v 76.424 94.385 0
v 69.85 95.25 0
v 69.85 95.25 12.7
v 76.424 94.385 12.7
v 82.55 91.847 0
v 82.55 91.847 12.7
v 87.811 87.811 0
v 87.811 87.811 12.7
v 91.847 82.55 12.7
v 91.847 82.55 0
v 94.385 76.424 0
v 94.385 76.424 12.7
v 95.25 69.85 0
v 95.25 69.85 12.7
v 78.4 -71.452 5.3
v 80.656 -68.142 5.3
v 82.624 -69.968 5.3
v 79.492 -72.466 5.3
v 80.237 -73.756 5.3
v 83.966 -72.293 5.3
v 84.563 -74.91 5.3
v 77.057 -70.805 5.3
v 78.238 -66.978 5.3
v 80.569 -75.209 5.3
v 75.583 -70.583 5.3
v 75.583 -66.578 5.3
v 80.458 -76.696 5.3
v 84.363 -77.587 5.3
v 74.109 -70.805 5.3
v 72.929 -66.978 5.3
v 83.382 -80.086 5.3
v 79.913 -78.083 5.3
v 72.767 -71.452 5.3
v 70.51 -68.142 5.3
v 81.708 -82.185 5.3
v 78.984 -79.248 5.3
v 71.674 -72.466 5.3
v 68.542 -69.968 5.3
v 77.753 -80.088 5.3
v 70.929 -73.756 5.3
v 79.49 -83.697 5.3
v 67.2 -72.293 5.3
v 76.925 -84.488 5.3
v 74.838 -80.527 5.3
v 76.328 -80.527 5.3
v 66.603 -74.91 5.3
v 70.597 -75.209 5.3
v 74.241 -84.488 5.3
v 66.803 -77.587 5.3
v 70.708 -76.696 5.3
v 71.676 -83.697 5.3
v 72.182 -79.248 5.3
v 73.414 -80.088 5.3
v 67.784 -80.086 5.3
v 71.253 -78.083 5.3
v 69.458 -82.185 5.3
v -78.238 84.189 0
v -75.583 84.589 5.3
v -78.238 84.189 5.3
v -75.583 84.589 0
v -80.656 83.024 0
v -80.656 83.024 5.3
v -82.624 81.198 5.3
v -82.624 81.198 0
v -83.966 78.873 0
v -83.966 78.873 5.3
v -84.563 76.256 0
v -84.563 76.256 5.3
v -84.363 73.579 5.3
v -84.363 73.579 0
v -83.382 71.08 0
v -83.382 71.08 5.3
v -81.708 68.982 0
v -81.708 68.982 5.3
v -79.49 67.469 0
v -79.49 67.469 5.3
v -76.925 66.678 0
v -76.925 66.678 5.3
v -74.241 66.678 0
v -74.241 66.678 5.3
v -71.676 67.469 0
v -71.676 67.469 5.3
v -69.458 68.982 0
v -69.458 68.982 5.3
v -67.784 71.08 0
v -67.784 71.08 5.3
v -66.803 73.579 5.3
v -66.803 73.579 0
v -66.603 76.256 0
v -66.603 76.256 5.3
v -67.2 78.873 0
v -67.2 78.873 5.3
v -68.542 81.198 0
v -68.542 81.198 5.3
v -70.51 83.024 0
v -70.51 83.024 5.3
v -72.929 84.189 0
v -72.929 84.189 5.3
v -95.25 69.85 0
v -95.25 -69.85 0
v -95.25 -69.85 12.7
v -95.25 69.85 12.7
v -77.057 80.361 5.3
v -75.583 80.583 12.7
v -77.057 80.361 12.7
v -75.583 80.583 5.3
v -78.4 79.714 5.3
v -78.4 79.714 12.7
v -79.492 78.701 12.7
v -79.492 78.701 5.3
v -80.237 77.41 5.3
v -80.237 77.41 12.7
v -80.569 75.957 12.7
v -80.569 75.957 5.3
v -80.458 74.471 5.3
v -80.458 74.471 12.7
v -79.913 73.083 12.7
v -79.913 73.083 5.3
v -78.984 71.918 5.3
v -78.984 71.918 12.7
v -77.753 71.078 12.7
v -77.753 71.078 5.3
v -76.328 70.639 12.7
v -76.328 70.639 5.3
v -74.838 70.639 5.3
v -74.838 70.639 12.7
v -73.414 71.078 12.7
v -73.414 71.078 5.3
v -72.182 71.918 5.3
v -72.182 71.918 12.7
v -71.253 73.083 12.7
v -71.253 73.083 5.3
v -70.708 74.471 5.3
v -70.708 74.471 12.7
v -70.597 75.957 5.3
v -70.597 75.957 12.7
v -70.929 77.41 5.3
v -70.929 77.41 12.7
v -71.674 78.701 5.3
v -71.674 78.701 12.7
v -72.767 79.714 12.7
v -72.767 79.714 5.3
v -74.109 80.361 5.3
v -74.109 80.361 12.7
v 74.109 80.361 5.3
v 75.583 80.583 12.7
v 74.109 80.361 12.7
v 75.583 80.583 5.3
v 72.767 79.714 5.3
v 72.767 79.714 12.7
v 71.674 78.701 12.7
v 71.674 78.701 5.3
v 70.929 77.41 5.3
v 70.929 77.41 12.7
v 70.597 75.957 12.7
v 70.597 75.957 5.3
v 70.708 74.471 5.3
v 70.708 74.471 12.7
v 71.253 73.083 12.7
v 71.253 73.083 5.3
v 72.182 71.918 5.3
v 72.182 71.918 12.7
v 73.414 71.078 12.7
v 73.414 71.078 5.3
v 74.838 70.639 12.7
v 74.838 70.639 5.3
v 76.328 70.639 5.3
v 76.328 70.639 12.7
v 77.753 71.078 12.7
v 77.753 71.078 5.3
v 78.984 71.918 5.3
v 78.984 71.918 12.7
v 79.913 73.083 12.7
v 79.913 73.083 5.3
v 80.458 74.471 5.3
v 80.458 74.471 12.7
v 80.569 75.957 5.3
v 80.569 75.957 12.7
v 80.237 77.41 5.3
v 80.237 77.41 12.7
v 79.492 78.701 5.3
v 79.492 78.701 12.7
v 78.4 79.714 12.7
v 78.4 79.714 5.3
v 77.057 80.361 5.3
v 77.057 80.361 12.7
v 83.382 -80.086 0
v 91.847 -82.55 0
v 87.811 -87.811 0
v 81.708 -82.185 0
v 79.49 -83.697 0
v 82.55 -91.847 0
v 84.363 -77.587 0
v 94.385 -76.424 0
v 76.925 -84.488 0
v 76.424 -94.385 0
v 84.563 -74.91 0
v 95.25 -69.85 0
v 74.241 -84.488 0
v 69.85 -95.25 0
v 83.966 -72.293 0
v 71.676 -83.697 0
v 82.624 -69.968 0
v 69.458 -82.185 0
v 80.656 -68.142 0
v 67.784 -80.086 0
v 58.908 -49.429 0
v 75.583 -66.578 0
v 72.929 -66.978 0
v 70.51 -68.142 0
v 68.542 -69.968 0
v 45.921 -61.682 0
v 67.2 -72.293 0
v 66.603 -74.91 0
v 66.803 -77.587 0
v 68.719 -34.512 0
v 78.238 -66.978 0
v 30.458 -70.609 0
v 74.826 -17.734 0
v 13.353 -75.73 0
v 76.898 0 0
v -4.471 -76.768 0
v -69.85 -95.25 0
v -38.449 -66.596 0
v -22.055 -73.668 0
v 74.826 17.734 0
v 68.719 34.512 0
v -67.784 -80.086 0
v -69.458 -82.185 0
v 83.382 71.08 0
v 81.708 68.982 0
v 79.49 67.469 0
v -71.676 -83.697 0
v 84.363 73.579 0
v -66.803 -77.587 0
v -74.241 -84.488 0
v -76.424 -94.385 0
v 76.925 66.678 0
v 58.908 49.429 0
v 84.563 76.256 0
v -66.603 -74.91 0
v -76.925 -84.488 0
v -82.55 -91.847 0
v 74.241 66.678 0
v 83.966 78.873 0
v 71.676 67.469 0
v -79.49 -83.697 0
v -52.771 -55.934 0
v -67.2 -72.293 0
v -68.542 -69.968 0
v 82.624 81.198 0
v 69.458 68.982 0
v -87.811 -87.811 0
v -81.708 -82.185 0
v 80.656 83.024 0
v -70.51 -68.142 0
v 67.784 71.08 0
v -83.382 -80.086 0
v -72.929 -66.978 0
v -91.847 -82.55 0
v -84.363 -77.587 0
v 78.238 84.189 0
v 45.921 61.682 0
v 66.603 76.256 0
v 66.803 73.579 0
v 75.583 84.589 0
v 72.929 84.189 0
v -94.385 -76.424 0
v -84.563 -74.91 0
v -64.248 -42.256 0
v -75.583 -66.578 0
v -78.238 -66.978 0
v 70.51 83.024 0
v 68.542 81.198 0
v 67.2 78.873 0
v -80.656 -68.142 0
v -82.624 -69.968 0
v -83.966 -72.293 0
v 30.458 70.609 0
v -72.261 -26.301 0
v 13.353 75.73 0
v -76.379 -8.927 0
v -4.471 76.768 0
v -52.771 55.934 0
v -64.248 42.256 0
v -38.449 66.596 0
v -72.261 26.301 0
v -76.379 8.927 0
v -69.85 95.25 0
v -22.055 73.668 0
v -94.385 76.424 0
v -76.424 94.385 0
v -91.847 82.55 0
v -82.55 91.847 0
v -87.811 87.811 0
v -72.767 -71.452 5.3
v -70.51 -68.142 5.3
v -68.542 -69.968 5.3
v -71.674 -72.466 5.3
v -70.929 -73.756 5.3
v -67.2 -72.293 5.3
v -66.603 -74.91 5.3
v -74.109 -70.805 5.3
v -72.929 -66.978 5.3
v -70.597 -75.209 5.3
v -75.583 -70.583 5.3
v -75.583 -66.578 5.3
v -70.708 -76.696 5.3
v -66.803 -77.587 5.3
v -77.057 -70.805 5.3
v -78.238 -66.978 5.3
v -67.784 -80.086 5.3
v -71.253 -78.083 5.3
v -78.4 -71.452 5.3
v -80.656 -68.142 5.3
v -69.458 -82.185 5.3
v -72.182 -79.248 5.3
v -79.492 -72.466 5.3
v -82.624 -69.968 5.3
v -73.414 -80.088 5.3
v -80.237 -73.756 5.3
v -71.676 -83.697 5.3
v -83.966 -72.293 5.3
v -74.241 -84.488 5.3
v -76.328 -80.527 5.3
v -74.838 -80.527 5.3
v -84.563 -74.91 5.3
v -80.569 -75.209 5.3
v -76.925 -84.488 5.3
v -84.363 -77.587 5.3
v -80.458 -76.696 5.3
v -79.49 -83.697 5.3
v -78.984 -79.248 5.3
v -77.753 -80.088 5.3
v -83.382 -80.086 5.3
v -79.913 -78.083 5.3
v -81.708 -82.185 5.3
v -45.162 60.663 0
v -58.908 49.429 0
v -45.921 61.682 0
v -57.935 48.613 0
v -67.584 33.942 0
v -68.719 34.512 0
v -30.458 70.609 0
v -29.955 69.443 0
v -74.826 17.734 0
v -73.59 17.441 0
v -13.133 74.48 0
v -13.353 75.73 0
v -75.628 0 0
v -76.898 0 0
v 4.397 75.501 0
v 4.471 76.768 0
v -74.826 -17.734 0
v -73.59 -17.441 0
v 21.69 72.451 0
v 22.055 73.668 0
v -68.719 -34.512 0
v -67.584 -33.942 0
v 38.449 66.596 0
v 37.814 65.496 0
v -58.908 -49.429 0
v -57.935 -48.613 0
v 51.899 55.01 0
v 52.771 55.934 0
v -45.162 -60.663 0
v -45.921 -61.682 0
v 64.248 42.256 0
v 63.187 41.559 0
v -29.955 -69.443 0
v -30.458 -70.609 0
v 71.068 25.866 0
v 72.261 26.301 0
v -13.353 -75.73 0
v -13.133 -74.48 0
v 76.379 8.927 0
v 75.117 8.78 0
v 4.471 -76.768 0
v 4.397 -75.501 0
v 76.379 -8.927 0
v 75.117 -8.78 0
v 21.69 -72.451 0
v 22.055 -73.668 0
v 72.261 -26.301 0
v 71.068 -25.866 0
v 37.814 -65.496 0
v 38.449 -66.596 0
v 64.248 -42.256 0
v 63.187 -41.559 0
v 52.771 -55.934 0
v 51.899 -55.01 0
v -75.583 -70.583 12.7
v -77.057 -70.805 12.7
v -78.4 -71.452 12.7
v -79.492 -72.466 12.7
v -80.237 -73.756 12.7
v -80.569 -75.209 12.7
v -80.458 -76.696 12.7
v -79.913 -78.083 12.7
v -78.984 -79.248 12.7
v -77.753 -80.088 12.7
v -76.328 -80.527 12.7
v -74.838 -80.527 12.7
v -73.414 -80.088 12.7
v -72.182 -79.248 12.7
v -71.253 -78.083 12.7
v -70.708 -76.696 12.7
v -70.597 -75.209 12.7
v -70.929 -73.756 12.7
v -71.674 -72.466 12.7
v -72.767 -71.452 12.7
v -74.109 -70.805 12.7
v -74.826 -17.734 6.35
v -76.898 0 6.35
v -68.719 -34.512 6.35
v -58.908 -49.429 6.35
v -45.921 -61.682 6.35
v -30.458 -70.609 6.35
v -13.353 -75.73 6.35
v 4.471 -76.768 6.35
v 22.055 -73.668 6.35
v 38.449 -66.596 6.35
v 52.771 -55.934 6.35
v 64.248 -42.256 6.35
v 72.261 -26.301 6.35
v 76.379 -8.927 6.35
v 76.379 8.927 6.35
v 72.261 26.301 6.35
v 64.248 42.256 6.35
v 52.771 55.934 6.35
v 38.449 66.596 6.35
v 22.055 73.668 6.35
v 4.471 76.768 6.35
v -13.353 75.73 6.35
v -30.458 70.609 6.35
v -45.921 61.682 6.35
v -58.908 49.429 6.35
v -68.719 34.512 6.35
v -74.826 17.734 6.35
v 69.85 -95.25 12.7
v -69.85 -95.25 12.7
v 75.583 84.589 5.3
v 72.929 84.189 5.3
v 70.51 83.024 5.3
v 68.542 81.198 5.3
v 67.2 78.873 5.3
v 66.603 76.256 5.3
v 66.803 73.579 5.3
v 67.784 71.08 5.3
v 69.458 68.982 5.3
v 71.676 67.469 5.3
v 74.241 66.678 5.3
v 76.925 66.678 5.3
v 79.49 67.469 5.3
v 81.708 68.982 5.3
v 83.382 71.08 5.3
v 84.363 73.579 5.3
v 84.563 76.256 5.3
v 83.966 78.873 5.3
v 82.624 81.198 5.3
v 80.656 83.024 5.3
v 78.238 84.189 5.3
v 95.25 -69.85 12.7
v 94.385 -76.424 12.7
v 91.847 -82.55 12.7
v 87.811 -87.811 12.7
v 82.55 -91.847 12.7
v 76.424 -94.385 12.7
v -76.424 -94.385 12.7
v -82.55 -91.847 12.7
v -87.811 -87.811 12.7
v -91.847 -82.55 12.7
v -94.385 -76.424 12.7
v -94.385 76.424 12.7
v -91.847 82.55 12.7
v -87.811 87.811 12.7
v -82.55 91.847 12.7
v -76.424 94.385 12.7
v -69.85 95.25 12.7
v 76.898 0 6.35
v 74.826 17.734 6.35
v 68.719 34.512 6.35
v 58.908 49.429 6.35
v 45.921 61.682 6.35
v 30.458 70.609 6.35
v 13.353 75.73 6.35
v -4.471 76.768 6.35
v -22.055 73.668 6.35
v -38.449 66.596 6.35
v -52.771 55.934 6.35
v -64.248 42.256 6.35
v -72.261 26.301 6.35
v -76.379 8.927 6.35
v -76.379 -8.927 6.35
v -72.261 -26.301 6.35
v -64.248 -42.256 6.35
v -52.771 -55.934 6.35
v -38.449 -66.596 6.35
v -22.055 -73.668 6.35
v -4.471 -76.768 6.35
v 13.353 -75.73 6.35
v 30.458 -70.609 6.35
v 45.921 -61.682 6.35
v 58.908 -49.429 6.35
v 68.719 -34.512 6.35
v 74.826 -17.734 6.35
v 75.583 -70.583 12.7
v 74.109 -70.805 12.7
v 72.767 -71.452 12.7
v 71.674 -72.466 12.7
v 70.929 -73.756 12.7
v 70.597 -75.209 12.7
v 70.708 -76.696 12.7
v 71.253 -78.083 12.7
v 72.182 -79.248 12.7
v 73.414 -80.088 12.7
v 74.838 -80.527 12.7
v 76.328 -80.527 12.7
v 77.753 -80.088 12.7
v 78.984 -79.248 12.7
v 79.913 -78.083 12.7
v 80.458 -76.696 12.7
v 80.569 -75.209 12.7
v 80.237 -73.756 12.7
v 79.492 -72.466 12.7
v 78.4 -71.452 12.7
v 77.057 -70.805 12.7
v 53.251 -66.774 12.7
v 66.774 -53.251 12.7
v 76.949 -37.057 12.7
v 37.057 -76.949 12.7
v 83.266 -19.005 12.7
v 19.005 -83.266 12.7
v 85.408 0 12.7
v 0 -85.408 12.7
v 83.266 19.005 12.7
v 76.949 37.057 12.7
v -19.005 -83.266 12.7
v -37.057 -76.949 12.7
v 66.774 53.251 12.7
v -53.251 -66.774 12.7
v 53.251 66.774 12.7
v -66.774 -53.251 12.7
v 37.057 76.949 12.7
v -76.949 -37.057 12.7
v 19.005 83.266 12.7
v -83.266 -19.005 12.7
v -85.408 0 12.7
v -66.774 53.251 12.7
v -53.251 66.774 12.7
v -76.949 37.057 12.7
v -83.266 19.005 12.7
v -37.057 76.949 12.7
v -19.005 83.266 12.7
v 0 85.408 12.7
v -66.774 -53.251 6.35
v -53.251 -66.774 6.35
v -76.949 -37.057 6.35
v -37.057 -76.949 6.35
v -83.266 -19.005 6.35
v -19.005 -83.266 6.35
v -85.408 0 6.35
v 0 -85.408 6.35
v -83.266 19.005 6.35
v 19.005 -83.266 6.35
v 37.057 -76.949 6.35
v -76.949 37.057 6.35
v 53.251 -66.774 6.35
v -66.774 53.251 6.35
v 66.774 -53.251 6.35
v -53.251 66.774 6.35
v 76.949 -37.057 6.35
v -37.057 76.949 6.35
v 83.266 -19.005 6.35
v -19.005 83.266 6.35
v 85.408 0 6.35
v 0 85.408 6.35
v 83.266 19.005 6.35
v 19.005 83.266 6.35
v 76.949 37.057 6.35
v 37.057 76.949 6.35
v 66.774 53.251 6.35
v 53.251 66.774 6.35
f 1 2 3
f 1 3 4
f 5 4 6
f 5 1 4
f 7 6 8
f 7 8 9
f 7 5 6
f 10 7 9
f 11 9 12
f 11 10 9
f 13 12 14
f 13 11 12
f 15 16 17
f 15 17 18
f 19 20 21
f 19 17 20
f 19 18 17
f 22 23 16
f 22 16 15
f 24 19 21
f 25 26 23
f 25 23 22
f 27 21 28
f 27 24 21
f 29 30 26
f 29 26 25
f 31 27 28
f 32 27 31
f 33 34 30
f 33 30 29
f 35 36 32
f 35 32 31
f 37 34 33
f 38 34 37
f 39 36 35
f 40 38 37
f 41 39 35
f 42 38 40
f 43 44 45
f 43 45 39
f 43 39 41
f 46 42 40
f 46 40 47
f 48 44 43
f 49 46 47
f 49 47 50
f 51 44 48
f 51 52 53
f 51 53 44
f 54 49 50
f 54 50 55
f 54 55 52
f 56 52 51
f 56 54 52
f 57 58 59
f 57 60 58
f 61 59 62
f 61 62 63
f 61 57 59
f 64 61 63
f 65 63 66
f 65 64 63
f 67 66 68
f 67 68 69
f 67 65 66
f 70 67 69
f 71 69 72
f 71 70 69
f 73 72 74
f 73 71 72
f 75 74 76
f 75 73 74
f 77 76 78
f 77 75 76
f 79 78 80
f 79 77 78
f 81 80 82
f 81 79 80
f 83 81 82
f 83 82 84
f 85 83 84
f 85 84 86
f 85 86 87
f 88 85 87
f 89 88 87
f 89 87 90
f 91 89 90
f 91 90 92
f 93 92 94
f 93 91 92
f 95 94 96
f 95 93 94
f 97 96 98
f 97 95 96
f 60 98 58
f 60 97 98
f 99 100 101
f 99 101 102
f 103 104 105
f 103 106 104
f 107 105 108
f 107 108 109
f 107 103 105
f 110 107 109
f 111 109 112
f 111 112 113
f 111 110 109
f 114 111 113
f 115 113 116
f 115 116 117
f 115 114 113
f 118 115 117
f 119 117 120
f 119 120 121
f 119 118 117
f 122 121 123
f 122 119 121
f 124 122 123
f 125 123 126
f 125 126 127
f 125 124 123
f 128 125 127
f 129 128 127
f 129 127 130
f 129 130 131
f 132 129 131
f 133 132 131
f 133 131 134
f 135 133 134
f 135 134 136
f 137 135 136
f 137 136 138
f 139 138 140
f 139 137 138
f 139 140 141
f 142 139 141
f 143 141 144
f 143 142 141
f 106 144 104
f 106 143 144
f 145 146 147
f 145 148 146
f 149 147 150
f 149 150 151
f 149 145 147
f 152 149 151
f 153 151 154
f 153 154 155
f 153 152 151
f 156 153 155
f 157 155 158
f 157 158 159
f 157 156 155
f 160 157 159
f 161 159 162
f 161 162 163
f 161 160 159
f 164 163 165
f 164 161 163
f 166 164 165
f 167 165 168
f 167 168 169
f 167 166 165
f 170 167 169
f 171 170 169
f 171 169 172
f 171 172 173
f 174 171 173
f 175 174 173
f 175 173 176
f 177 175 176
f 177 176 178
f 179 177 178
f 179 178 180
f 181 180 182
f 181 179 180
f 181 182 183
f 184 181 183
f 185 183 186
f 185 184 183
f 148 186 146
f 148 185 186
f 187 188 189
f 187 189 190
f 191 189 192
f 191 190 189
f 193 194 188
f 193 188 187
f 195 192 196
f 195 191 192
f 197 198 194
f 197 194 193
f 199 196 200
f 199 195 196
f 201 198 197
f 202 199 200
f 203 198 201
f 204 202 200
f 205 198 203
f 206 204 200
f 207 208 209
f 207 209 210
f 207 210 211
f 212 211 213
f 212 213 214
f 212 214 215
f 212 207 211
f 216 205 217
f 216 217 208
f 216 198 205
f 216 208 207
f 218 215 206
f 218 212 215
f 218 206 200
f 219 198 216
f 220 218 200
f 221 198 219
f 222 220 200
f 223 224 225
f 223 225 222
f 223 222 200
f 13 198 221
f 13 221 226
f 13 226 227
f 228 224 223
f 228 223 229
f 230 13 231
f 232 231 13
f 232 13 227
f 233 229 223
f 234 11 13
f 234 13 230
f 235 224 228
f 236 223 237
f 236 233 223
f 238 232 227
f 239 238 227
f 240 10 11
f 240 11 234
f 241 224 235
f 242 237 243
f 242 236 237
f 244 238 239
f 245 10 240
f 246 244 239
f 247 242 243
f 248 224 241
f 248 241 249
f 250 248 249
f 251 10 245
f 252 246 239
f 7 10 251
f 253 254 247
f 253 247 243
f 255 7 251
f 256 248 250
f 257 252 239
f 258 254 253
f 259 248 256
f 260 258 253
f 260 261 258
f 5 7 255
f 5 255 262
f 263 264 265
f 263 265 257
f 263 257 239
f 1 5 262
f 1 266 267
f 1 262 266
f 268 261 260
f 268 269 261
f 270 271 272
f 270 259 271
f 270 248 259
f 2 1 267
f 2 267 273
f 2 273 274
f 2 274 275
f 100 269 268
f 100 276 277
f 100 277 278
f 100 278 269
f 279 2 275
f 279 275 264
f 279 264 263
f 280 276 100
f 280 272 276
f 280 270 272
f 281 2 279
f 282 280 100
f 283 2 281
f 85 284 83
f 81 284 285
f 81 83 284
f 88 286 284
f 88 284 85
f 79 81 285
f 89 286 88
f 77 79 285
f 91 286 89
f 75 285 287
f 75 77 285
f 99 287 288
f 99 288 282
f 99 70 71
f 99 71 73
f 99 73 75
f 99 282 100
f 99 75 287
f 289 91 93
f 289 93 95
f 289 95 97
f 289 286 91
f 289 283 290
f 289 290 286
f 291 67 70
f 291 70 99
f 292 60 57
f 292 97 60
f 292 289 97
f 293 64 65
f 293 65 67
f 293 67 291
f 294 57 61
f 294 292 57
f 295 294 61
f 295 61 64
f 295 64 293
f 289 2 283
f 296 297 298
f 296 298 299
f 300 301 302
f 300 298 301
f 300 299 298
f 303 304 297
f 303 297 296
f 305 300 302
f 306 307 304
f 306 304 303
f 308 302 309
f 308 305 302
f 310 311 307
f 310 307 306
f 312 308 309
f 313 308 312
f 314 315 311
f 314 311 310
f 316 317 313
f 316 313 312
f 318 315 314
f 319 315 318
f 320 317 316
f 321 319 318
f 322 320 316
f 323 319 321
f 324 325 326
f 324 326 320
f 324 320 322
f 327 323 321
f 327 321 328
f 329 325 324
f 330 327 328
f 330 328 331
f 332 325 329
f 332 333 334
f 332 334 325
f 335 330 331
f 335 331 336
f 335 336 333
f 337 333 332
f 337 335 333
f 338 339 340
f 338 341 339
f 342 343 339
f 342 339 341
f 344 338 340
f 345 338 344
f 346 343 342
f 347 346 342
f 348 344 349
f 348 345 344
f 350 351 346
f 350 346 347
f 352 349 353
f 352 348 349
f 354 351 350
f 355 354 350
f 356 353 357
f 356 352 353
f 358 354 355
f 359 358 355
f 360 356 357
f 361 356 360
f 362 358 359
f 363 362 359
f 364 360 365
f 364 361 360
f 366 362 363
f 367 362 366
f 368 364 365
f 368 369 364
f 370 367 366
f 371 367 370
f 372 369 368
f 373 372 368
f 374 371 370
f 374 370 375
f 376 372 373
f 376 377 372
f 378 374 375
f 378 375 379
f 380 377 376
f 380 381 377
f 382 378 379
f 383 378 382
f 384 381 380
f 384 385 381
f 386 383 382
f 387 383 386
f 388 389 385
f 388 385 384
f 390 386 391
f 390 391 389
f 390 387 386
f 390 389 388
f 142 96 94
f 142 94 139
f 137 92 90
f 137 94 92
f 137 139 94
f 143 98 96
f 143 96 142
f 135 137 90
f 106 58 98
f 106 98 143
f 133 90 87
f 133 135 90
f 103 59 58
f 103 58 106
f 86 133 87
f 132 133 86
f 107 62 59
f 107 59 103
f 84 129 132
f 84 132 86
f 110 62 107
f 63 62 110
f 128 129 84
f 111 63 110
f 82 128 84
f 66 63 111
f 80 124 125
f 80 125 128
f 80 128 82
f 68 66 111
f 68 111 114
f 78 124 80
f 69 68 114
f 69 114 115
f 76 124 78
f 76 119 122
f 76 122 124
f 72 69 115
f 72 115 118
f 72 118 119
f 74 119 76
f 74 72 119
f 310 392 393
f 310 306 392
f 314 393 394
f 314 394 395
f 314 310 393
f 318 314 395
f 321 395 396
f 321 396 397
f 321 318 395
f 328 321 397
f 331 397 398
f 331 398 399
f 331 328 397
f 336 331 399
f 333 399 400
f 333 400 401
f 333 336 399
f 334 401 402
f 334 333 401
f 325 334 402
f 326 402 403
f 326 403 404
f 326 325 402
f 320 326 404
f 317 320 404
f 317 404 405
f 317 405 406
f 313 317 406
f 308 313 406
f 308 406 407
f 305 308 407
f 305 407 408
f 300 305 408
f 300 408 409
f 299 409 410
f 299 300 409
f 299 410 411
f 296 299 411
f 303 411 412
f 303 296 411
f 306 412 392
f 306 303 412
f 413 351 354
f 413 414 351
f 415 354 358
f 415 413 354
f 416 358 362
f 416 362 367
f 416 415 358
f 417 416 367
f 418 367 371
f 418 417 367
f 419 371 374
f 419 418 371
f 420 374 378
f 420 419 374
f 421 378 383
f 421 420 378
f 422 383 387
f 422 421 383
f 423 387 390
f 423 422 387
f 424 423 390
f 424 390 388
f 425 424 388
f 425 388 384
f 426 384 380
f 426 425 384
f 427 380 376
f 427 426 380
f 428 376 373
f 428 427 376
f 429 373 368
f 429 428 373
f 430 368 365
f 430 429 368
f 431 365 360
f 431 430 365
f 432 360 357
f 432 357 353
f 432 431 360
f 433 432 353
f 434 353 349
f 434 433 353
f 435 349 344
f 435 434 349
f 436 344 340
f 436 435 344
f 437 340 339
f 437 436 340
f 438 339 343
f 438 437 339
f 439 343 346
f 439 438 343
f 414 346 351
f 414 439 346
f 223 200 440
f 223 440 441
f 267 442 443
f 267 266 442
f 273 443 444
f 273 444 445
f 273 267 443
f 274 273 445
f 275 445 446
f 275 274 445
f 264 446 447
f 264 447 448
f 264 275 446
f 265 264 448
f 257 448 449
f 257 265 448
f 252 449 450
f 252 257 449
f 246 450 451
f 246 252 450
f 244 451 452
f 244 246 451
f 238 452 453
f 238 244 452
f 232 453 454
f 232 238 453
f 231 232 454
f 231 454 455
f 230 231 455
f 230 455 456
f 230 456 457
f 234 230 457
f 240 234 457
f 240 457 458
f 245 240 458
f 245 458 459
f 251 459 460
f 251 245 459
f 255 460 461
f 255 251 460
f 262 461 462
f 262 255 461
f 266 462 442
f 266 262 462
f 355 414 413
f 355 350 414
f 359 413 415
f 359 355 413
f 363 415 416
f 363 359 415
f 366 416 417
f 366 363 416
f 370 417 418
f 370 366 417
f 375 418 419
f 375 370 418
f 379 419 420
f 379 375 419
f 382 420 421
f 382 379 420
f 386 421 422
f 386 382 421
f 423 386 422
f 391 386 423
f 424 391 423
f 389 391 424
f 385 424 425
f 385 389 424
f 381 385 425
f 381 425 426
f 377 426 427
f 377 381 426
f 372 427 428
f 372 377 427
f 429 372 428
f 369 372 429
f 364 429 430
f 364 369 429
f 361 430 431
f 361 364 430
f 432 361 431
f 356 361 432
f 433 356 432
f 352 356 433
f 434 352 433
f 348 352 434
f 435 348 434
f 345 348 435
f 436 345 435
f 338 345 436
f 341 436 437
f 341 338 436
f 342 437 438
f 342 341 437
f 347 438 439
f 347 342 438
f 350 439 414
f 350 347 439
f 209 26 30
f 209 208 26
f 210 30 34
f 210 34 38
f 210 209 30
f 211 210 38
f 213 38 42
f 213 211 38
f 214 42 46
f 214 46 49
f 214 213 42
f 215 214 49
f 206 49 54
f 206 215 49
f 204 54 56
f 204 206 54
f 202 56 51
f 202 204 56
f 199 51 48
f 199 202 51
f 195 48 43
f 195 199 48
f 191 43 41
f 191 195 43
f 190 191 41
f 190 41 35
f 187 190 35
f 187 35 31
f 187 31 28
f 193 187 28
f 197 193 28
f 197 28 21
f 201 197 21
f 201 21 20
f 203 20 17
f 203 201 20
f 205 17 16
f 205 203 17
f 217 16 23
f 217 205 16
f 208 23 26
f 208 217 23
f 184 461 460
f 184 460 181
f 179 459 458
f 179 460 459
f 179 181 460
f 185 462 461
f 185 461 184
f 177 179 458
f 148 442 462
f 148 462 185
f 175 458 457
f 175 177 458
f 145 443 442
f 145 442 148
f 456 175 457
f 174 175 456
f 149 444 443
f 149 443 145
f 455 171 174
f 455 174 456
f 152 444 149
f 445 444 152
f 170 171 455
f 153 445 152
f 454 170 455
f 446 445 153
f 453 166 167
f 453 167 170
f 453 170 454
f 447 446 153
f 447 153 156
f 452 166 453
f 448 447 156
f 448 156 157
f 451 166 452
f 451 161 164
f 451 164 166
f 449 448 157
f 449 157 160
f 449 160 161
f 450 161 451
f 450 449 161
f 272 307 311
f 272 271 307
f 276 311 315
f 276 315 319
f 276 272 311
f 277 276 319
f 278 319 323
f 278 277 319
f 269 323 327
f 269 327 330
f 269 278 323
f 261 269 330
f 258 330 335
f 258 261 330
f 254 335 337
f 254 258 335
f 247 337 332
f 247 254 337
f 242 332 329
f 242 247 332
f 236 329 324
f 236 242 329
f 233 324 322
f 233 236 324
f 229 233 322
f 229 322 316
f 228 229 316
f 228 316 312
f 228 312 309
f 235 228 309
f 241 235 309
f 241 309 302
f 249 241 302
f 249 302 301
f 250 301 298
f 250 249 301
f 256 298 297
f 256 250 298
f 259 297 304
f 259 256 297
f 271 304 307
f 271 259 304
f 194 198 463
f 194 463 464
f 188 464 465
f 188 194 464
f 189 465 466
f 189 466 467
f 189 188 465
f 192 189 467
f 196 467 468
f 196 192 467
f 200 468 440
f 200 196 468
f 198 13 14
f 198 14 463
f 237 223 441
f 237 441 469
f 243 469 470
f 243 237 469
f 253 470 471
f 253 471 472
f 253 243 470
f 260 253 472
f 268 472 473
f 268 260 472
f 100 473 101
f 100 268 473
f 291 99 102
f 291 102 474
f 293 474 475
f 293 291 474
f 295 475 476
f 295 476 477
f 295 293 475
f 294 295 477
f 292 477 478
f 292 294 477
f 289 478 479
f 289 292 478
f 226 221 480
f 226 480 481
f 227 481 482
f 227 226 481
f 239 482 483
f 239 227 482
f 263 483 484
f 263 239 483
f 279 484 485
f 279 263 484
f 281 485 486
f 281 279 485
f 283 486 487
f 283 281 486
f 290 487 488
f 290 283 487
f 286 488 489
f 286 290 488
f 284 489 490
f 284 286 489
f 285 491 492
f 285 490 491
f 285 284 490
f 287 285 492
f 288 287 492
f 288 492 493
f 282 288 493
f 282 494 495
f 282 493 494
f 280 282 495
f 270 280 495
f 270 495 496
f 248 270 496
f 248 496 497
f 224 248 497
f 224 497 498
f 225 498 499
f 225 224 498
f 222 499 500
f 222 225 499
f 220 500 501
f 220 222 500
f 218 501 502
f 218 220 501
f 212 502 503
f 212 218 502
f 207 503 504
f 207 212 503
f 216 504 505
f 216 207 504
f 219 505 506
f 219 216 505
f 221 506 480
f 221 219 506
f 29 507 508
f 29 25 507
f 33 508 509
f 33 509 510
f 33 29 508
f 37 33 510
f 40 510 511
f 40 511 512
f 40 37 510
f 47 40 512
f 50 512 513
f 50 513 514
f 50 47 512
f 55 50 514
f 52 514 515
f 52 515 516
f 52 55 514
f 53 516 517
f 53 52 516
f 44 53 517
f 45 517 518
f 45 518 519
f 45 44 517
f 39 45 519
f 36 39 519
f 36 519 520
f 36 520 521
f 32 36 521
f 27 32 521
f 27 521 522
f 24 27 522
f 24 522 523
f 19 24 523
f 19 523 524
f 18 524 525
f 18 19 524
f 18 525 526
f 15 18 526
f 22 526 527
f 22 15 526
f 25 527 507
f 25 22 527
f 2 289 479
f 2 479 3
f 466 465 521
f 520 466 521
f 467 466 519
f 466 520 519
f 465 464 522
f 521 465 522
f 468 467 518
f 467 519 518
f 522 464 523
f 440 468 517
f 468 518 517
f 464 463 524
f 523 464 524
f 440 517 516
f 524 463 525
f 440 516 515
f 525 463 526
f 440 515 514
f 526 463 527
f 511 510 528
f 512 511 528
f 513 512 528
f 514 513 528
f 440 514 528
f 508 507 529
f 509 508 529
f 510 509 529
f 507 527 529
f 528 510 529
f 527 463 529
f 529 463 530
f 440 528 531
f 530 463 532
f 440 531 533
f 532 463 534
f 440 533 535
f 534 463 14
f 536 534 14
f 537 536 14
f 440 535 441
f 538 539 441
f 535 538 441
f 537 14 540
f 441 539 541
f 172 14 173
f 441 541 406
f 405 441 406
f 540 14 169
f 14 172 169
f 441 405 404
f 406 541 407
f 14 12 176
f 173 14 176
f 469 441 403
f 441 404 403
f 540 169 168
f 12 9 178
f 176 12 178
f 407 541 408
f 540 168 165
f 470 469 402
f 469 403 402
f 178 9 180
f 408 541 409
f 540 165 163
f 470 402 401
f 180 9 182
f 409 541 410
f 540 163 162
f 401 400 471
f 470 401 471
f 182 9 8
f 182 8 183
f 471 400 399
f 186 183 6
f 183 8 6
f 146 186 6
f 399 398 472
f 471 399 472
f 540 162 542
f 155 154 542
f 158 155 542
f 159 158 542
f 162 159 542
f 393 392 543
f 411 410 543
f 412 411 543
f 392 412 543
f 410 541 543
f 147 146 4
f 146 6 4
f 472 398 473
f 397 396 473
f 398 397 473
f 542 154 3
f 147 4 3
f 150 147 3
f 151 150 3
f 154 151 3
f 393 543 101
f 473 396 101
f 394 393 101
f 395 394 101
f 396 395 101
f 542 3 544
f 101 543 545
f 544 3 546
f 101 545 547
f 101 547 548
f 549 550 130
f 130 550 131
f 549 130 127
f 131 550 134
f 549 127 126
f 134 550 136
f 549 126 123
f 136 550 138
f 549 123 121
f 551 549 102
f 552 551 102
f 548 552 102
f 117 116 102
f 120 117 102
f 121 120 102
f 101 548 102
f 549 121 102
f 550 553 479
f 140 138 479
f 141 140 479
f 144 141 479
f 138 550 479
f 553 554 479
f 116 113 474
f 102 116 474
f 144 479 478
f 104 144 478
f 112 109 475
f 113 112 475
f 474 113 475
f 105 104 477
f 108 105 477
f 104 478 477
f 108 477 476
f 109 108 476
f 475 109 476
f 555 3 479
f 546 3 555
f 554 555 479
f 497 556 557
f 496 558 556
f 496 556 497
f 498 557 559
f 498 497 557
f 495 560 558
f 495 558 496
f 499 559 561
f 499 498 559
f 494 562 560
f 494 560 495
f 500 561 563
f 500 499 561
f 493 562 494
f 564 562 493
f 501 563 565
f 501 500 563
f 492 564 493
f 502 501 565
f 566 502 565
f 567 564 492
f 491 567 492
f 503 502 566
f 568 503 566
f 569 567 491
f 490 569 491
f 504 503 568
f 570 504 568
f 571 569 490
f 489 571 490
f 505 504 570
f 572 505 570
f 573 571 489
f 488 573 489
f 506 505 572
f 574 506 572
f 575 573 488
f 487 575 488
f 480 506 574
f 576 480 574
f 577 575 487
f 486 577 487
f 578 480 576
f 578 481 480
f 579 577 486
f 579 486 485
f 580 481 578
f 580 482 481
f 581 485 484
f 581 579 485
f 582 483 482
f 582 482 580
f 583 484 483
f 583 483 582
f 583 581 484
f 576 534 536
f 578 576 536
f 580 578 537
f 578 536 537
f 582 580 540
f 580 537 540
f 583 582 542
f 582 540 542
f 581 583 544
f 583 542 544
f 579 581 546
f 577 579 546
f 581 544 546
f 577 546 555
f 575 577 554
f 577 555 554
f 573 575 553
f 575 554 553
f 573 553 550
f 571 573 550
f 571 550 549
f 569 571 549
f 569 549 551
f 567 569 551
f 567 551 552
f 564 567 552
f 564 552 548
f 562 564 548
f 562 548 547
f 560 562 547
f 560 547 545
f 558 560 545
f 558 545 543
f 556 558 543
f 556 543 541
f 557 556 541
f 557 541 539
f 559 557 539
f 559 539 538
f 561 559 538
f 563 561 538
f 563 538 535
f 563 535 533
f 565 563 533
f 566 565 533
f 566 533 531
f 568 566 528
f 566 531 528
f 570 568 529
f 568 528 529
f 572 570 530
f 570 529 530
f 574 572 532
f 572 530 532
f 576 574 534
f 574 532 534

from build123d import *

# Parameters (mm, degrees)
SKETCH1_R                              = 76.8985
BOSS_EXTRUDE1_DEPTH                    = 12.7
INSET_START                            = 25.4
SKETCH4_R                              = 85.4075
SKETCH4_R_2                            = 76.2
INSET_RIM_DEPTH                        = 19.05
CBORE_FOR_M8_HEX_HEAD_BOLT1_AT_2_COUNT = 2
CBORE_FOR_M8_HEX_HEAD_BOLT1_AT_2_PITCH = 213.781317332
CBORE_FOR_M8_HEX_HEAD_BOLT1_AT_3_COUNT = 2
CBORE_FOR_M8_HEX_HEAD_BOLT1_AT_3_PITCH = 151.166219176
CBORE_FOR_M8_HEX_HEAD_BOLT1_AT_4_COUNT = 2
CBORE_FOR_M8_HEX_HEAD_BOLT1_AT_4_PITCH = 151.166219176


with BuildPart() as part:
    # Sketch1 → Boss-Extrude1 (new body)
    with BuildSketch(Plane.XY):
        with BuildLine():
            Line((95.25, 69.85), (95.25, -69.85))
            ThreePointArc((95.25, -69.85), (87.810512242, -87.810512242), (69.85, -95.25))
            Line((69.85, -95.25), (-69.85, -95.25))
            ThreePointArc((-69.85, -95.25), (-87.810512242, -87.810512242), (-95.25, -69.85))
            Line((-95.25, -69.85), (-95.25, 69.85))
            ThreePointArc((-95.25, 69.85), (-87.810512242, 87.810512242), (-69.85, 95.25))
            Line((-69.85, 95.25), (69.85, 95.25))
            ThreePointArc((69.85, 95.25), (87.810512242, 87.810512242), (95.25, 69.85))
        make_face()
        Circle(SKETCH1_R, mode=Mode.SUBTRACT)
    extrude(amount=BOSS_EXTRUDE1_DEPTH)

    # Sketch4 → Inset Rim (cut)
    with BuildSketch(Plane.XY.offset(INSET_START)):
        Circle(SKETCH4_R)
        Circle(SKETCH4_R_2, mode=Mode.SUBTRACT)
    extrude(amount=-INSET_RIM_DEPTH, mode=Mode.SUBTRACT)

    # Sketch8 → CBORE for M8 Hex Head Bolt1 (revolve, cut)
    with BuildSketch(Plane(origin=(-75.583109588, -75.583109588, 0), x_dir=(0, 1, 0), z_dir=(1, 0, 0))):
        Polygon((0, 0), (0, 12.7), (5, 12.7), (5, 5.3), (9.0055, 5.3), (9.0055, 0), align=None)
    cbore_for_m8_hex_head_bolt1 = revolve(axis=Axis((-75.583109588, -75.583109588, -6.35), (0, 0, 1)), mode=Mode.SUBTRACT)

    # CBORE for M8 Hex Head Bolt1 at 2: CBORE for M8 Hex Head Bolt1 ×2
    with Locations(*[Vector(0.707106781, 0.707106781, 0) * (i * CBORE_FOR_M8_HEX_HEAD_BOLT1_AT_2_PITCH) for i in range(1, CBORE_FOR_M8_HEX_HEAD_BOLT1_AT_2_COUNT)]):
        add(cbore_for_m8_hex_head_bolt1, mode=Mode.SUBTRACT)

    # CBORE for M8 Hex Head Bolt1 at 3: CBORE for M8 Hex Head Bolt1 ×2
    with Locations(*[(0, i * CBORE_FOR_M8_HEX_HEAD_BOLT1_AT_3_PITCH, 0) for i in range(1, CBORE_FOR_M8_HEX_HEAD_BOLT1_AT_3_COUNT)]):
        add(cbore_for_m8_hex_head_bolt1, mode=Mode.SUBTRACT)

    # CBORE for M8 Hex Head Bolt1 at 4: CBORE for M8 Hex Head Bolt1 ×2
    with Locations(*[(i * CBORE_FOR_M8_HEX_HEAD_BOLT1_AT_4_PITCH, 0, 0) for i in range(1, CBORE_FOR_M8_HEX_HEAD_BOLT1_AT_4_COUNT)]):
        add(cbore_for_m8_hex_head_bolt1, mode=Mode.SUBTRACT)


with BuildPart() as body_2:
    # Sketch6 → Revolve1 (revolve)
    with BuildSketch(Plane(origin=(0, 0, 0), x_dir=(1, 0, 0), z_dir=(0, 1, 0))):
        Polygon((-76.8985, 0), (-76.8985, -6.35), (-75.6285, 0), align=None)
    revolve(axis=Axis((0, 0, -10.998218641), (0, 0, 1)))


solid = Compound([part.part, body_2.part])
